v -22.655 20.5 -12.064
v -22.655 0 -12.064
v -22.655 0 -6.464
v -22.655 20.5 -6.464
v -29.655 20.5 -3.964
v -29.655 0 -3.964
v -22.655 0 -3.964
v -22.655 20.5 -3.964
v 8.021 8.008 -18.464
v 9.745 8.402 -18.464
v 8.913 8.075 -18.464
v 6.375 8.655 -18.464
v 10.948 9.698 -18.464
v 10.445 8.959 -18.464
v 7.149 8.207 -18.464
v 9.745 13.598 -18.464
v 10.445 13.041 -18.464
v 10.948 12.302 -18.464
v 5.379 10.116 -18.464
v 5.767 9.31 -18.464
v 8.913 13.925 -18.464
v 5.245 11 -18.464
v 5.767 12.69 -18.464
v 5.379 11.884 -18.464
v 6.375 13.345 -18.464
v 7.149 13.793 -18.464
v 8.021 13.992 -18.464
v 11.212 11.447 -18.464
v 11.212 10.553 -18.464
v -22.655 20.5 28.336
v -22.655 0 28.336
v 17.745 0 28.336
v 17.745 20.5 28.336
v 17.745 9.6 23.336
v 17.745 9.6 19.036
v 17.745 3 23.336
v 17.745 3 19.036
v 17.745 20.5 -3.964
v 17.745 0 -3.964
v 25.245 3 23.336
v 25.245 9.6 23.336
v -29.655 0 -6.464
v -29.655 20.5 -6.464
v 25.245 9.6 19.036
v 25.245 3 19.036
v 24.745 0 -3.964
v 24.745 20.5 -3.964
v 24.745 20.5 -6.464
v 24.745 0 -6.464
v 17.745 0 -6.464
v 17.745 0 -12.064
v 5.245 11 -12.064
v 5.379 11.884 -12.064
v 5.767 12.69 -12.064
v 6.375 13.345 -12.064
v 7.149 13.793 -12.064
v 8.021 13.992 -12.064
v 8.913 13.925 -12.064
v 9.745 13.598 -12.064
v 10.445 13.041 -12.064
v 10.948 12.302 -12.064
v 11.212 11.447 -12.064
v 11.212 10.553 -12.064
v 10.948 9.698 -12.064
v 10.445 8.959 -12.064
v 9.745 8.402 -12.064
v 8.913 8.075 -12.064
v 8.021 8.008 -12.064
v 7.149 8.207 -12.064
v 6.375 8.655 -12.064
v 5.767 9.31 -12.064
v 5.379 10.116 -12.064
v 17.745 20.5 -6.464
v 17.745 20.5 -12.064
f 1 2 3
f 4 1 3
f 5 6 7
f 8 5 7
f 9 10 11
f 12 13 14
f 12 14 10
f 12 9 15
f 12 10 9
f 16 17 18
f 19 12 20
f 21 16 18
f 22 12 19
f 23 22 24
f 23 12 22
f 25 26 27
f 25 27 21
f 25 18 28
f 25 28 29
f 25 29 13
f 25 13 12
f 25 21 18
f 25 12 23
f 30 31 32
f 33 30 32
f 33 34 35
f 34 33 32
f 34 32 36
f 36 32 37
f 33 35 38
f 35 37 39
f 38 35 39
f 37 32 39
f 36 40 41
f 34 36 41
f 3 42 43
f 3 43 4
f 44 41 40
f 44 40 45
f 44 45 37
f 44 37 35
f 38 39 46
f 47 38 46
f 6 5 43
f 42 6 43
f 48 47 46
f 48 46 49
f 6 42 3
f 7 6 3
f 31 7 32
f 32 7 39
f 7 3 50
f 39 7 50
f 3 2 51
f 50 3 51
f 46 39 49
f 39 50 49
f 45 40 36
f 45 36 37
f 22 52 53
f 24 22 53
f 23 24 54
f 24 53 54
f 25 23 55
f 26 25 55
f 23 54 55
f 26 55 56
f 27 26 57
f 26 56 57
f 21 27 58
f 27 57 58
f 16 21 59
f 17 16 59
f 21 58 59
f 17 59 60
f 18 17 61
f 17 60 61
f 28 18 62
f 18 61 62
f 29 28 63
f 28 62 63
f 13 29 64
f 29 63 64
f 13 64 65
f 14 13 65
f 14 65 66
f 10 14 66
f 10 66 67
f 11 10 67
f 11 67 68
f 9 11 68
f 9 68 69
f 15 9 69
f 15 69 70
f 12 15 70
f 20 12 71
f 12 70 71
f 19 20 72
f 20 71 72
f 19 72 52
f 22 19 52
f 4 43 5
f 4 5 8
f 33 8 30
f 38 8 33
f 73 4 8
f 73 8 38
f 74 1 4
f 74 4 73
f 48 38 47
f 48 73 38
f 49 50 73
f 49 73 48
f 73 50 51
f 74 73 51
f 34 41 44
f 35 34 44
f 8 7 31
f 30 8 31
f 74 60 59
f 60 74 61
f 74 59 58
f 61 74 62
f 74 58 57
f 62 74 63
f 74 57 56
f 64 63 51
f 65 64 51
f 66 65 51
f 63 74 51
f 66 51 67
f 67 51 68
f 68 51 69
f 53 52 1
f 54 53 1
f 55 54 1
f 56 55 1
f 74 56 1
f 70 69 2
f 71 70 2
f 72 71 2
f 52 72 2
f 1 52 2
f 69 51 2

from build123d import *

# Parameters (mm, degrees)
SKETCH2_W           = 7
SKETCH2_H           = 2.5
BOSS_EXTRUDE3_DEPTH = 20.5
SKETCH4_W           = 4.3
SKETCH4_H           = 6.6
WIRE_2_DEPTH        = 7.5
SKETCH6_R           = 3
BOSS_EXTRUDE5_DEPTH = 6.4


with BuildPart() as part:
    # Sketch2 → Boss-Extrude3 (new body)
    with BuildSketch(Plane(origin=(0, 0, 0), x_dir=(1, 0, 0), z_dir=(0, 1, 0))):
        with Locations((-26.15465113, 5.213732574)):
            Rectangle(SKETCH2_W, SKETCH2_H)
        Polygon((-2.45465113, -28.336267426), (-2.45465113, 12.063732574), (-22.65465113, 12.063732574), (-22.65465113, 6.463732574), (-22.65465113, 3.963732574), (-22.65465113, -28.336267426), align=None)
        Polygon((17.74534887, 12.063732574), (-2.45465113, 12.063732574), (-2.45465113, -28.336267426), (17.74534887, -28.336267426), (17.74534887, 3.963732574), (17.74534887, 6.463732574), align=None)
        with Locations((21.24534887, 5.213732574)):
            Rectangle(SKETCH2_W, SKETCH2_H)
    extrude(amount=BOSS_EXTRUDE3_DEPTH)

    # Sketch4 → Wire 2 (add)
    with BuildSketch(Plane(origin=(17.74534887, 0, 0), x_dir=(0, 0, -1), z_dir=(1, 0, 0))):
        with Locations((-21.186267426, 6.3)):
            Rectangle(SKETCH4_W, SKETCH4_H)
    extrude(amount=WIRE_2_DEPTH)

    # Sketch6 → Boss-Extrude5 (add)
    with BuildSketch(Plane(origin=(0, 0, -12.063732574), x_dir=(-1, 0, 0), z_dir=(0, 0, -1))):
        with Locations((-8.24534887, 11)):
            Circle(SKETCH6_R)
    extrude(amount=BOSS_EXTRUDE5_DEPTH)


solid = part.part
